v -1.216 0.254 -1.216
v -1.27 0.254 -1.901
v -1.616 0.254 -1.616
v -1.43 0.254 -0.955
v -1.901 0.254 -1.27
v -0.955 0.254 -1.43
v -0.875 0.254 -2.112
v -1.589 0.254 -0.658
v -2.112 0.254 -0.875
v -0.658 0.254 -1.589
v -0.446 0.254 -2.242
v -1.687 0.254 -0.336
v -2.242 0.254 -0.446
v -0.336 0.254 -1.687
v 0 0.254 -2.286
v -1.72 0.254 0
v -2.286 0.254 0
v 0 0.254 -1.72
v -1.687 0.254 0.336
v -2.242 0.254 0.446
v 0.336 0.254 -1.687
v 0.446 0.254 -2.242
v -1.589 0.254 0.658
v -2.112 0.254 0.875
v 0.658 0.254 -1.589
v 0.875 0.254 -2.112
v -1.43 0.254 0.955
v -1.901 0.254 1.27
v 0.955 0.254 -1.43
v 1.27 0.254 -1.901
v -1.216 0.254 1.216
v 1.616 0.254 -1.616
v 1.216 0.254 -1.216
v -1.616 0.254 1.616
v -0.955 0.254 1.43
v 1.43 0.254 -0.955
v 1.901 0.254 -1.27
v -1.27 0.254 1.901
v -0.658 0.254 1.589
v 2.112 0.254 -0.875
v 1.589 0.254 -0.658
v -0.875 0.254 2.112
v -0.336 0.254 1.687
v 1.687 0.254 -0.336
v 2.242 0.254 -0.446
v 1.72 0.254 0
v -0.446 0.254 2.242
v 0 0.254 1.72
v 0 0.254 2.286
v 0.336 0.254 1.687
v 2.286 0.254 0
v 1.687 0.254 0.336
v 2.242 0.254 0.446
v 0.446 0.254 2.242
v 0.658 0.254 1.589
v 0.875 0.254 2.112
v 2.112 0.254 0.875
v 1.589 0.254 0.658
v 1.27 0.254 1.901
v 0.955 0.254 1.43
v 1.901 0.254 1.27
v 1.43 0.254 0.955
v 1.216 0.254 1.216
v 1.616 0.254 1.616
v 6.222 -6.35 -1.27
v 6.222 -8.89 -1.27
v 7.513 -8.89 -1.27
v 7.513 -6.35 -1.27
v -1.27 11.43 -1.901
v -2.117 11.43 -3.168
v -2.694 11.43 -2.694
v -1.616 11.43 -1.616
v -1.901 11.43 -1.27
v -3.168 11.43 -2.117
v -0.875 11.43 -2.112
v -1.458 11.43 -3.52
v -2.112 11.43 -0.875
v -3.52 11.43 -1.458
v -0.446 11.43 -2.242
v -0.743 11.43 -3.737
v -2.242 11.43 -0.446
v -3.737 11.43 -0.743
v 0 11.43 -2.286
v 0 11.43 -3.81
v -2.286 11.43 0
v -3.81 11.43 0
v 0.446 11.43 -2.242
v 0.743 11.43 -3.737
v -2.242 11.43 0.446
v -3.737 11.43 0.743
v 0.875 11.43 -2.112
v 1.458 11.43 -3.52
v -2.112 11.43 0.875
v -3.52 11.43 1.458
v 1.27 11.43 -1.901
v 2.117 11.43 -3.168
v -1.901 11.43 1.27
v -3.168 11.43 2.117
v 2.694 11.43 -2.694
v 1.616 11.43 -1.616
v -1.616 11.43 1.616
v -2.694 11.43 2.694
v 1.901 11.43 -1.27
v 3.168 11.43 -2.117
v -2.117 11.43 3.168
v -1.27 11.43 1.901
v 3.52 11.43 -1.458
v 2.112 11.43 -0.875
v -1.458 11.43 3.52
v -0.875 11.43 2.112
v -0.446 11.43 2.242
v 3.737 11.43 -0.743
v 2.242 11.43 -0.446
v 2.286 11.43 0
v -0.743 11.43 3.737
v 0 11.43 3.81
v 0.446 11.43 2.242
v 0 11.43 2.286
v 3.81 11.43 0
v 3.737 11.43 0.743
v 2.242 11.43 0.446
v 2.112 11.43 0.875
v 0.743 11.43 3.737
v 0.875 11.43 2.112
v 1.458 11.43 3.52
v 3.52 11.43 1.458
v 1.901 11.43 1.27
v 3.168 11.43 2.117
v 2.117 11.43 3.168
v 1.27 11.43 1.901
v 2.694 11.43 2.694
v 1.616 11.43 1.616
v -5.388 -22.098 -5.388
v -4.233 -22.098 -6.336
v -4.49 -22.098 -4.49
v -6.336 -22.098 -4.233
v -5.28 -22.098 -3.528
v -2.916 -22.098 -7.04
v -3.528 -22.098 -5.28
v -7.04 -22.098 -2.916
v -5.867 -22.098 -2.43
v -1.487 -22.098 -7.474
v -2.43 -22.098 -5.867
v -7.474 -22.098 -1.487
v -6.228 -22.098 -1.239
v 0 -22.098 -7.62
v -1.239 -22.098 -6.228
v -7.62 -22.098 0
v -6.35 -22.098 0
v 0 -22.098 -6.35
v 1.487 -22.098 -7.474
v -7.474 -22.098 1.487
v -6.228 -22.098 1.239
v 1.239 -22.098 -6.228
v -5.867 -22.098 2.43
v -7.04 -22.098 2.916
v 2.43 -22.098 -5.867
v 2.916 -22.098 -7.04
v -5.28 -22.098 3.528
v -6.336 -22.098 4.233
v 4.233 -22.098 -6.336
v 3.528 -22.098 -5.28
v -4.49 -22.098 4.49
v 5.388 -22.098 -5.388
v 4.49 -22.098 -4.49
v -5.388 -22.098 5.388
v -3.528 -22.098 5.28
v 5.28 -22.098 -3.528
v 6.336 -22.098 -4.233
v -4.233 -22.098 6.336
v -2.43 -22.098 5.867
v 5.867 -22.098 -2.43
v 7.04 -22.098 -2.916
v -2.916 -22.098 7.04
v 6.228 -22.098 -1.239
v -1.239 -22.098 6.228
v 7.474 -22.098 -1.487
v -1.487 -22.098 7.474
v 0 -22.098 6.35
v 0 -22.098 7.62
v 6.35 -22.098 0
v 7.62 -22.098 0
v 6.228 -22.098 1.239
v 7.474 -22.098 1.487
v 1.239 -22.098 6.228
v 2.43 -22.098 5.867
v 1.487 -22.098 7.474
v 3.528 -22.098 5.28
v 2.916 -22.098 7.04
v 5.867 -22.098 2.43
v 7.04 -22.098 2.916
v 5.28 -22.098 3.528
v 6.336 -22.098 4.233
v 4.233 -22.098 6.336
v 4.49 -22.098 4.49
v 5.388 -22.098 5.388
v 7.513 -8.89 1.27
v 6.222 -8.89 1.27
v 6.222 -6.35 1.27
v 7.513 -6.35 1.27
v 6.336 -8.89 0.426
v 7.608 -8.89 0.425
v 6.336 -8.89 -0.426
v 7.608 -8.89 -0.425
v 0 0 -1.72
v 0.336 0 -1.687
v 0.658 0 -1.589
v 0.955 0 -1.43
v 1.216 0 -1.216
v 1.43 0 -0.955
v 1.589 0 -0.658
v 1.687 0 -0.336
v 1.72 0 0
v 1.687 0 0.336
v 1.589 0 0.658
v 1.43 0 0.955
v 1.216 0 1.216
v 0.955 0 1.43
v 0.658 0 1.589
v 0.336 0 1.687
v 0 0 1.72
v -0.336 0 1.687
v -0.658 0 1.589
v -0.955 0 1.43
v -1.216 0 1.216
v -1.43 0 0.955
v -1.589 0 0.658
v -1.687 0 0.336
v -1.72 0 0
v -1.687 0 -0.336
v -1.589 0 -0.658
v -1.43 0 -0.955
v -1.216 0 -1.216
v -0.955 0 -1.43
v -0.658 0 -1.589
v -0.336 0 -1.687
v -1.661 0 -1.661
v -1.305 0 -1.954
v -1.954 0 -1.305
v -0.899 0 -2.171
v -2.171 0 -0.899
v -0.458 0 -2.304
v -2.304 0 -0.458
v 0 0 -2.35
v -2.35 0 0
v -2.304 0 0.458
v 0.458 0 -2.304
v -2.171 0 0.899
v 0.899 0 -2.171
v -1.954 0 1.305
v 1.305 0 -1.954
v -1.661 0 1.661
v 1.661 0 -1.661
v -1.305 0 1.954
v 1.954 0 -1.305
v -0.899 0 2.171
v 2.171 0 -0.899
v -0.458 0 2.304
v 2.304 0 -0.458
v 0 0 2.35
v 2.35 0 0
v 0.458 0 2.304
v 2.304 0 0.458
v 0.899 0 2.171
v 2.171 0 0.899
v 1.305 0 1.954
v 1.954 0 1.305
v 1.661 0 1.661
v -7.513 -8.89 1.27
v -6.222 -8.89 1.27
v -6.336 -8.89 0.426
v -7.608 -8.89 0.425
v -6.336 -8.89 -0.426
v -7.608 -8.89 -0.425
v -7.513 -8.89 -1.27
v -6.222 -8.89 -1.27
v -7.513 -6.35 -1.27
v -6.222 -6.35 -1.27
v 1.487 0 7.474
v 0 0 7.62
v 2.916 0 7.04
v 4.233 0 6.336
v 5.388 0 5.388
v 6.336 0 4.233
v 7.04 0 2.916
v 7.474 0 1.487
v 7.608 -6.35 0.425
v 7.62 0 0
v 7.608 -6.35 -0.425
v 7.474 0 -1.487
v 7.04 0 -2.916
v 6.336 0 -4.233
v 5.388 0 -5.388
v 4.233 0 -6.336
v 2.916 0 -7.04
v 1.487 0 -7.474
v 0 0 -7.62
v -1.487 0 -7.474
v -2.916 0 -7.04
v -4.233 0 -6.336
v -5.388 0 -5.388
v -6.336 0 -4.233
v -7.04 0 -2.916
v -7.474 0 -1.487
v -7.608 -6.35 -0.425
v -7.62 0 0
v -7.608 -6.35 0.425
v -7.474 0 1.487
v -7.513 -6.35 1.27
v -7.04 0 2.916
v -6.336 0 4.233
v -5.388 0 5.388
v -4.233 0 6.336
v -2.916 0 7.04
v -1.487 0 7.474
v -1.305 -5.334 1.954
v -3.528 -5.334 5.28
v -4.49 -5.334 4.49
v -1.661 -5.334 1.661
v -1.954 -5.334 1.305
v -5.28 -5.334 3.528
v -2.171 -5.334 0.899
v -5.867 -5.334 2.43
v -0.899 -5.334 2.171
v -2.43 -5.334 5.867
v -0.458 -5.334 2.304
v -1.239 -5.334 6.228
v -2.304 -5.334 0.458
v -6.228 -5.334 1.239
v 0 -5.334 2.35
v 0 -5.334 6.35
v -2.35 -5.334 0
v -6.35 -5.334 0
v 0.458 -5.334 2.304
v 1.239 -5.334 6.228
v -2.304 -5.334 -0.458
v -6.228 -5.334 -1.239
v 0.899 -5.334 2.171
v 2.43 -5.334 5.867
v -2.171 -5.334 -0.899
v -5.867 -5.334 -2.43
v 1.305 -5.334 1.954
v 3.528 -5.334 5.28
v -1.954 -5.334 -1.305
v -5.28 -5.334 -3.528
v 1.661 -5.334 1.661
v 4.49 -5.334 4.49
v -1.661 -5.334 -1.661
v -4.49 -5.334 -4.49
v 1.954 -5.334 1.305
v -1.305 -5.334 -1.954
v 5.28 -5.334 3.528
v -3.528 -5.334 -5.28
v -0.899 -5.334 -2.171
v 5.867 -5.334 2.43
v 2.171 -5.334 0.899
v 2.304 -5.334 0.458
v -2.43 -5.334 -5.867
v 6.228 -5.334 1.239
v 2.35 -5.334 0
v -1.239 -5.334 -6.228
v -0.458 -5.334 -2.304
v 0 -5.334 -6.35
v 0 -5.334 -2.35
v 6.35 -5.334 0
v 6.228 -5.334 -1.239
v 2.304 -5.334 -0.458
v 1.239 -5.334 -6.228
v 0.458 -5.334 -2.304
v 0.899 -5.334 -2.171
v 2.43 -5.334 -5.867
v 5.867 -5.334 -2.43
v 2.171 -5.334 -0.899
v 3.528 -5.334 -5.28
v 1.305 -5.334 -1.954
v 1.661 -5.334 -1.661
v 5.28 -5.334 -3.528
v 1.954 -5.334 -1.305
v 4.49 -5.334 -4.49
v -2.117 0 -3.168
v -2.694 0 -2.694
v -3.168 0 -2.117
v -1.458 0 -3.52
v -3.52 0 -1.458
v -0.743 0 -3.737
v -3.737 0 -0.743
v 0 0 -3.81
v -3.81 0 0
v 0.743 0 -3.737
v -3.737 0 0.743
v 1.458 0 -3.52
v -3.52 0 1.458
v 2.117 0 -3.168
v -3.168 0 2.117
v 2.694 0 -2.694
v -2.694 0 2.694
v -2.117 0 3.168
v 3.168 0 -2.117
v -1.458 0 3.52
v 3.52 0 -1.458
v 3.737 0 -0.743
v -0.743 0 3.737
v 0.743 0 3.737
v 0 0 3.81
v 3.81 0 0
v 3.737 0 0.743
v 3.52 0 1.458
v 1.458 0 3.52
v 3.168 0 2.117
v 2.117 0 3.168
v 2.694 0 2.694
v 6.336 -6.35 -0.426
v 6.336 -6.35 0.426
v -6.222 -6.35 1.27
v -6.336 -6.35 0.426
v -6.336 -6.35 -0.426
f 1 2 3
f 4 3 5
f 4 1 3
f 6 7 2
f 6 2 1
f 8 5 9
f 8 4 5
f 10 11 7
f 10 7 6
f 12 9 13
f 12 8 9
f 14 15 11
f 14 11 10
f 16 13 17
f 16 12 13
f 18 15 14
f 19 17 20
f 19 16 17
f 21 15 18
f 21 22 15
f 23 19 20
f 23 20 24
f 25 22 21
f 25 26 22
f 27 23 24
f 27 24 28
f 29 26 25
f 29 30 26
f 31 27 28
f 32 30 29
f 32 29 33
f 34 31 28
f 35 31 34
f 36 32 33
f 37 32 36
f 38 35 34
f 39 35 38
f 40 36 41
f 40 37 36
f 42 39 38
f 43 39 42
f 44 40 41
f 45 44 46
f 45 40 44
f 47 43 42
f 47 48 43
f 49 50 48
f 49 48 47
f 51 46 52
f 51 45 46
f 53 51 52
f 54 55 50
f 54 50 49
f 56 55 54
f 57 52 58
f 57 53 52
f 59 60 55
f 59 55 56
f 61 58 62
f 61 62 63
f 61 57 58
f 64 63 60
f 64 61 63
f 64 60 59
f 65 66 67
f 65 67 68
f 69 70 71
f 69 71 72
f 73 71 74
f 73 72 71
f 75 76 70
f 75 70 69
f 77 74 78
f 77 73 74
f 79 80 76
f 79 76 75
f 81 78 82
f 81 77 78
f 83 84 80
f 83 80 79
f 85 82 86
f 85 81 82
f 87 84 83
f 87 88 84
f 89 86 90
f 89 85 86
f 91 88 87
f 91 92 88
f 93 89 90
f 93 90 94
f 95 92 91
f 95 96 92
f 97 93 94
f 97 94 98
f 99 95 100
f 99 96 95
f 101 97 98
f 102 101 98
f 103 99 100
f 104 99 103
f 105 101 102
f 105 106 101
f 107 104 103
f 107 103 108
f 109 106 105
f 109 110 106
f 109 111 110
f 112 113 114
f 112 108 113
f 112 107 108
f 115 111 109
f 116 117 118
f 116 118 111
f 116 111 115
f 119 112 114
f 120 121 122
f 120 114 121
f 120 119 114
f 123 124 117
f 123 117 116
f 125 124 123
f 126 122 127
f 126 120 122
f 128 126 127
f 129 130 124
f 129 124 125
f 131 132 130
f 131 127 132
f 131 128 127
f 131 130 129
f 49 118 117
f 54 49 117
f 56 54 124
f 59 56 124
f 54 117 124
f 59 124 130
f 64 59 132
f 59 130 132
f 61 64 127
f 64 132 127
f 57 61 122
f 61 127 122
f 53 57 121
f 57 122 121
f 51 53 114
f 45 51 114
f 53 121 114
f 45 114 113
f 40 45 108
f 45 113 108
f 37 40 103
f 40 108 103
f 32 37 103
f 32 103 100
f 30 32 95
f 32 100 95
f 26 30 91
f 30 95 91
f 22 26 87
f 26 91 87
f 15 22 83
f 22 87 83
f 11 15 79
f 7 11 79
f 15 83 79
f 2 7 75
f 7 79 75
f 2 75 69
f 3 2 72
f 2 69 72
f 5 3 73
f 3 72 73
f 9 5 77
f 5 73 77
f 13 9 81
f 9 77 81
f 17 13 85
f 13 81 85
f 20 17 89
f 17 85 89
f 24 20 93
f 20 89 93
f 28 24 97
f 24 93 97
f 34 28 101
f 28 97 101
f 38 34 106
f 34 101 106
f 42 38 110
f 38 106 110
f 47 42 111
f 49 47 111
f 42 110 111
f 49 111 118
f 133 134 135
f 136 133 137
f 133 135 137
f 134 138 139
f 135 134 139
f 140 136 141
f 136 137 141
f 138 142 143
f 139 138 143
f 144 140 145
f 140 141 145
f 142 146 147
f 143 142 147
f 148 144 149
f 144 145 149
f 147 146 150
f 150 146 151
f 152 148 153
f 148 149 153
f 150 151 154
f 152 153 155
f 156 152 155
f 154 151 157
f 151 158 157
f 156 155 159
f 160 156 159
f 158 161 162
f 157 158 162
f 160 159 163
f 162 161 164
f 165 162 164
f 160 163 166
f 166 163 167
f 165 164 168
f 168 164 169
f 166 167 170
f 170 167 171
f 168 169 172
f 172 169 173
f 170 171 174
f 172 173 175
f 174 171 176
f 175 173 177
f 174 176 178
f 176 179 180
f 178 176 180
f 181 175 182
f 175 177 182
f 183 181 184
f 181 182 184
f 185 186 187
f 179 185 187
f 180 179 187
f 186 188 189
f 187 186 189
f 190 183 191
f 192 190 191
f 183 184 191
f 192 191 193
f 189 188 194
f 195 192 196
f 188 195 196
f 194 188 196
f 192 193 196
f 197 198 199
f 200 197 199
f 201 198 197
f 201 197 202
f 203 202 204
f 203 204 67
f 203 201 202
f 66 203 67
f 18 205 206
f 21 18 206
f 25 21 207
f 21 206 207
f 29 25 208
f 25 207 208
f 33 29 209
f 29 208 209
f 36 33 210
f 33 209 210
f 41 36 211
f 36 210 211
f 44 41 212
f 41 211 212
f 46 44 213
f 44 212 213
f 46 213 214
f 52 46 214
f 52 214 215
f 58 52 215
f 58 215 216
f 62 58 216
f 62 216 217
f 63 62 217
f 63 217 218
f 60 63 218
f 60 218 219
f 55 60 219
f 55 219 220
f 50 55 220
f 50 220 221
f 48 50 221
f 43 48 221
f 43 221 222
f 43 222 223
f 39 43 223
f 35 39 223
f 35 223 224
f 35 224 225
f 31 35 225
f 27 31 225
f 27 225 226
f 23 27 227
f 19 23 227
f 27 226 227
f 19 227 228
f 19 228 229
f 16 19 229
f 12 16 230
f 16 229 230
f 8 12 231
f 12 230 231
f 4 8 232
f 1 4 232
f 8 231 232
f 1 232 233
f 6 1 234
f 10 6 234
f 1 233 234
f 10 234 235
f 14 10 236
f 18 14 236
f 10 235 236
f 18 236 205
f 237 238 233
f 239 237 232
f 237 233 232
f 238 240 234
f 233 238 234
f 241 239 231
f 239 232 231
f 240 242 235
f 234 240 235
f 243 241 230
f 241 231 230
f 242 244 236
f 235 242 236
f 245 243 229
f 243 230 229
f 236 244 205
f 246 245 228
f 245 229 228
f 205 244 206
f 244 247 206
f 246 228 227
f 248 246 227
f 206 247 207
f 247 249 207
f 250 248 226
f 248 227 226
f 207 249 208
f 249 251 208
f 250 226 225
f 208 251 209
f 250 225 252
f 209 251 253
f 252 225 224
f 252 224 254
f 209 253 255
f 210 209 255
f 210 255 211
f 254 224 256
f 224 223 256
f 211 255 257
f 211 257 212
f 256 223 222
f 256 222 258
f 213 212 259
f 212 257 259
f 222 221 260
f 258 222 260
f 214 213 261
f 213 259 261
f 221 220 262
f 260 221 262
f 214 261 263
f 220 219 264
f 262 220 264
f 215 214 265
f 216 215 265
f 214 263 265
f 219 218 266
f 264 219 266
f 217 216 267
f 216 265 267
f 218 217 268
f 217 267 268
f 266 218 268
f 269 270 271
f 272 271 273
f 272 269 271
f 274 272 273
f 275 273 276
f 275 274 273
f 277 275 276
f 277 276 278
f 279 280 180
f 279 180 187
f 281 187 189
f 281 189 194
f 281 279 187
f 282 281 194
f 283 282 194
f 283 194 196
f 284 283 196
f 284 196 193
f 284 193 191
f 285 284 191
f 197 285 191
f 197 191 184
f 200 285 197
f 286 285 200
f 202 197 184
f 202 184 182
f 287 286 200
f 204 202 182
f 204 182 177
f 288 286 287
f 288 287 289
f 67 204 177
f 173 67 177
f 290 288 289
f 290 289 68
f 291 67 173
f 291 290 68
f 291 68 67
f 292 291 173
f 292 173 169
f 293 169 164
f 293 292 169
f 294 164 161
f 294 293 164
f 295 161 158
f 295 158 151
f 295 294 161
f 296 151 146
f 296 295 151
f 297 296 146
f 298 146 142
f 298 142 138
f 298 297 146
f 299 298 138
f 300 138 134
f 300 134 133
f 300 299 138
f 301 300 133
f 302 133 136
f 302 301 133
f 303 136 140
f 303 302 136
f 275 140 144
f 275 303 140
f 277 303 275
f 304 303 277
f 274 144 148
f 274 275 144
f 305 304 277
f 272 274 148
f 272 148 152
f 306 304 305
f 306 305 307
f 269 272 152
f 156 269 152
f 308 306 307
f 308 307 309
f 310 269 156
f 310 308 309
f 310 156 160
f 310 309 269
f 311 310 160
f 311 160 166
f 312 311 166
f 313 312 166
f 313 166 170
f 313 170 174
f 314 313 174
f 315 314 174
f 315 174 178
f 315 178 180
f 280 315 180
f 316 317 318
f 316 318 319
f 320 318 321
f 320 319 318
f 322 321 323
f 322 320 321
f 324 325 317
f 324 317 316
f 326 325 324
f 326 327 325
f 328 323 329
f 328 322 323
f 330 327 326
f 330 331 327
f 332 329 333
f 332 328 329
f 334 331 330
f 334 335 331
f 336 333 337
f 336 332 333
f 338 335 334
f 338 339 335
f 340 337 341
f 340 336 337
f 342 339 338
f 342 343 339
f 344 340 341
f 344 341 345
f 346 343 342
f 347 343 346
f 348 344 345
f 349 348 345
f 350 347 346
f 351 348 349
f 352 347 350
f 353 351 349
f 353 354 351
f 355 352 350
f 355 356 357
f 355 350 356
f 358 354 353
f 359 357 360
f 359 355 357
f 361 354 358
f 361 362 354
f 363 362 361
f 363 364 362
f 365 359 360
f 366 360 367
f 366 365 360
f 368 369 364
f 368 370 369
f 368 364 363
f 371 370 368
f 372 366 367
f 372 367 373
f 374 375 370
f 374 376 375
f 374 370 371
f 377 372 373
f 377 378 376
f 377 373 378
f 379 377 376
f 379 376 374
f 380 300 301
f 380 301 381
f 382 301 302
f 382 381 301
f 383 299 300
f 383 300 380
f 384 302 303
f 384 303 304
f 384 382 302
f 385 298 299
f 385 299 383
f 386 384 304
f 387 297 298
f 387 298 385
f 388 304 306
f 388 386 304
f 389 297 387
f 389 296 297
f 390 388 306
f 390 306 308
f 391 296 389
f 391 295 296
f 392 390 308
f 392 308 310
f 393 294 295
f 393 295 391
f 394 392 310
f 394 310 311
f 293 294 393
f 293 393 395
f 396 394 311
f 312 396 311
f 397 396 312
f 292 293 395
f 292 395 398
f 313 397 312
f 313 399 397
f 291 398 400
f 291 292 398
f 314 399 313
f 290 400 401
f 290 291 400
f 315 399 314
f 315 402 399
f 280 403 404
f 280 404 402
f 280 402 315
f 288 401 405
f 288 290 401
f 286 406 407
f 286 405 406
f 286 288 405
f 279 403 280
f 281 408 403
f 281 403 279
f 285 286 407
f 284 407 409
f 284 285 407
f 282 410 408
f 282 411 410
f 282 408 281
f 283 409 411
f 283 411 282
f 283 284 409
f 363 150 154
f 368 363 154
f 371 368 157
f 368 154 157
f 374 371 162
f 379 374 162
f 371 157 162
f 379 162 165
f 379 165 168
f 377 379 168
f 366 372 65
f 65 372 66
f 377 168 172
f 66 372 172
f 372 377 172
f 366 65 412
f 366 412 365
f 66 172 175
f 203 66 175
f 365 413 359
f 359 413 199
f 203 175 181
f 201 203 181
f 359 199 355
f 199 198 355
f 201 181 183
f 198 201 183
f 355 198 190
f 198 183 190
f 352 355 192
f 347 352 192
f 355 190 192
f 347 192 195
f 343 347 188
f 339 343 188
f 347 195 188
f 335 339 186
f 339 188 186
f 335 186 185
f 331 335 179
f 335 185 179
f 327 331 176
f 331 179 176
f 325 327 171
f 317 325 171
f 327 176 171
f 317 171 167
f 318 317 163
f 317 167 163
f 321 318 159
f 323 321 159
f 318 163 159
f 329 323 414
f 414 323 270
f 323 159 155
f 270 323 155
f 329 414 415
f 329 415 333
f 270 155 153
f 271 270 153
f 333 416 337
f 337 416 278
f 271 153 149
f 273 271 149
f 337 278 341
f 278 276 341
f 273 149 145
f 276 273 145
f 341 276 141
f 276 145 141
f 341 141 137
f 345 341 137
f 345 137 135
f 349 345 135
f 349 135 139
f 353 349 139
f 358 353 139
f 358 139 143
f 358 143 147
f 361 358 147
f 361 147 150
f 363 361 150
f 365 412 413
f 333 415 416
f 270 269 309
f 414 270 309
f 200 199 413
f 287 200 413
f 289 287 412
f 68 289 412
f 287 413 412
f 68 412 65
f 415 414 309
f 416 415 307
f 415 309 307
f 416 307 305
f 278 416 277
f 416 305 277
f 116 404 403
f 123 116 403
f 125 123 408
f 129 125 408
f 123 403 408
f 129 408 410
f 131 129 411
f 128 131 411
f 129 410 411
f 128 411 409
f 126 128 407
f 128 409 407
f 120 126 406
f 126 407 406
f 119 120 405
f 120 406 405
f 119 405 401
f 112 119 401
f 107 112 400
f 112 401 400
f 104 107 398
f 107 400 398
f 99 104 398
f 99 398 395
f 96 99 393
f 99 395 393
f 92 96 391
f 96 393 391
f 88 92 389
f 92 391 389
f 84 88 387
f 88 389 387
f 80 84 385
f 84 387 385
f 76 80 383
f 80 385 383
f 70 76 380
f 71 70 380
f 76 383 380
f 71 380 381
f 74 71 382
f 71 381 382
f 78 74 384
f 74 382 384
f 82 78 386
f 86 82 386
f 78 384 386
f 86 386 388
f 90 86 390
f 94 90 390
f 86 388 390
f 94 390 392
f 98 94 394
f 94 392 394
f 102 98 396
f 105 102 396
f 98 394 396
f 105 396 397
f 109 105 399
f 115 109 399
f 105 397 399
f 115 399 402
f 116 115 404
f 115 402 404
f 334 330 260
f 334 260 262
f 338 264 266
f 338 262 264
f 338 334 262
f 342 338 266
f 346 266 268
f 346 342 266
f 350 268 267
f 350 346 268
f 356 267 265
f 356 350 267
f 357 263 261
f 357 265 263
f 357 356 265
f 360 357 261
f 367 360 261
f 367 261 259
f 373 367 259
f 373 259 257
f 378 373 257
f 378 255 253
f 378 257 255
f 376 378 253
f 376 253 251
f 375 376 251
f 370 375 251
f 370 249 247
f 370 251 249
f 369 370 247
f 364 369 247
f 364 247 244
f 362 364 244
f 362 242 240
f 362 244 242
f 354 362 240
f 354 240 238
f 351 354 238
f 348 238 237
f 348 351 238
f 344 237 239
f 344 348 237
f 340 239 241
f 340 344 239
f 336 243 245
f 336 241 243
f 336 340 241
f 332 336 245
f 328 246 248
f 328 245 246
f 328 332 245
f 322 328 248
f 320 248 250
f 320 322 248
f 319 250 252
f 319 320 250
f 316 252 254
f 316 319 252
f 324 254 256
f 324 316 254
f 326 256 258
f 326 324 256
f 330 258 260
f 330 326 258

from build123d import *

# Parameters (mm, degrees)
SKETCH2_R                = 7.62
BOSS_EXTRUDE1_DEPTH      = 22.098
SKETCH3_R                = 6.35
CUT_EXTRUDE1_DEPTH       = 16.764
CUT_EXTRUDE3_DEPTH       = 16.764
CUT_EXTRUDE3_DEPTH_BACK  = 25.585573087
SKETCH5_R                = 2.3495
SKETCH6_R                = 3.81
BOSS_EXTRUDE2_DEPTH      = 11.43
SKETCH8_R                = 2.286
CUT_EXTRUDE4_DEPTH       = 11.176
CUT_EXTRUDE8_REACH       = 26.586
SKETCH10_R               = 1.719833609
CUT_EXTRUDE10_DEPTH      = 25.585573087
CUT_EXTRUDE10_DEPTH_BACK = 25.585573087
SKETCH12_W               = 2.54
SKETCH12_H               = 2.54


with BuildPart() as part:
    # Sketch2 → Boss-Extrude1 (new body)
    with BuildSketch(Plane(origin=(0, 0, 0), x_dir=(1, 0, 0), z_dir=(0, 1, 0))):
        with Locations(Location((0, 0, 0), (0, 0, 270))):
            Circle(SKETCH2_R)
    extrude(amount=-BOSS_EXTRUDE1_DEPTH)

    # Sketch3 → Cut-Extrude1 (cut)
    with BuildSketch(Plane.XZ.offset(22.098)):
        with Locations(Location((0, 0, 0), (0, 0, 270))):
            Circle(SKETCH3_R)
    extrude(amount=-CUT_EXTRUDE1_DEPTH, mode=Mode.SUBTRACT)

    # Sketch5 → Cut-Extrude3 (cut, two sides: drawn at the far end of the back side and taken through both)
    with BuildSketch(Plane(origin=(0, 0, 0), x_dir=(1, 0, 0), z_dir=(0, 1, 0)).offset(-CUT_EXTRUDE3_DEPTH_BACK)):
        with Locations(Location((0, 0, 0), (0, 0, 270))):
            Circle(SKETCH5_R)
    extrude(amount=CUT_EXTRUDE3_DEPTH + CUT_EXTRUDE3_DEPTH_BACK, mode=Mode.SUBTRACT)

    # Sketch6 → Boss-Extrude2 (add)
    with BuildSketch(Plane(origin=(0, 0, 0), x_dir=(1, 0, 0), z_dir=(0, 1, 0))):
        with Locations(Location((0, 0, 0), (0, 0, 270))):
            Circle(SKETCH6_R)
    extrude(amount=BOSS_EXTRUDE2_DEPTH)

    # Sketch8 → Cut-Extrude4 (cut)
    with BuildSketch(Plane(origin=(0, 11.43, 0), x_dir=(1, 0, 0), z_dir=(0, 1, 0))):
        with Locations(Location((0, 0, 0), (0, 0, 270))):
            Circle(SKETCH8_R)
    extrude(amount=-CUT_EXTRUDE4_DEPTH, mode=Mode.SUBTRACT)

    # Sketch10 → Cut-Extrude8 (cut, up to next)
    with BuildSketch(Plane.XZ, mode=Mode.PRIVATE) as cut_extrude8_sk1:
        with Locations(Location((0, 0, 0), (0, 0, 270))):
            Circle(SKETCH10_R)
    cut_extrude8_tool1 = extrude(cut_extrude8_sk1.sketch, amount=-CUT_EXTRUDE8_REACH, mode=Mode.PRIVATE) & part.part
    add(cut_extrude8_tool1.solids().sort_by_distance((0, 0, 0))[0], mode=Mode.SUBTRACT)

    # Sketch12 → Cut-Extrude10 (cut, two sides: drawn at the far end of the back side and taken through both)
    with BuildSketch(Plane(origin=(0, 0, 0), x_dir=(0, 0, -1), z_dir=(1, 0, 0)).offset(-CUT_EXTRUDE10_DEPTH_BACK)):
        with Locations((0, -7.62)):
            Rectangle(SKETCH12_W, SKETCH12_H)
    extrude(amount=CUT_EXTRUDE10_DEPTH + CUT_EXTRUDE10_DEPTH_BACK, mode=Mode.SUBTRACT)


solid = part.part
